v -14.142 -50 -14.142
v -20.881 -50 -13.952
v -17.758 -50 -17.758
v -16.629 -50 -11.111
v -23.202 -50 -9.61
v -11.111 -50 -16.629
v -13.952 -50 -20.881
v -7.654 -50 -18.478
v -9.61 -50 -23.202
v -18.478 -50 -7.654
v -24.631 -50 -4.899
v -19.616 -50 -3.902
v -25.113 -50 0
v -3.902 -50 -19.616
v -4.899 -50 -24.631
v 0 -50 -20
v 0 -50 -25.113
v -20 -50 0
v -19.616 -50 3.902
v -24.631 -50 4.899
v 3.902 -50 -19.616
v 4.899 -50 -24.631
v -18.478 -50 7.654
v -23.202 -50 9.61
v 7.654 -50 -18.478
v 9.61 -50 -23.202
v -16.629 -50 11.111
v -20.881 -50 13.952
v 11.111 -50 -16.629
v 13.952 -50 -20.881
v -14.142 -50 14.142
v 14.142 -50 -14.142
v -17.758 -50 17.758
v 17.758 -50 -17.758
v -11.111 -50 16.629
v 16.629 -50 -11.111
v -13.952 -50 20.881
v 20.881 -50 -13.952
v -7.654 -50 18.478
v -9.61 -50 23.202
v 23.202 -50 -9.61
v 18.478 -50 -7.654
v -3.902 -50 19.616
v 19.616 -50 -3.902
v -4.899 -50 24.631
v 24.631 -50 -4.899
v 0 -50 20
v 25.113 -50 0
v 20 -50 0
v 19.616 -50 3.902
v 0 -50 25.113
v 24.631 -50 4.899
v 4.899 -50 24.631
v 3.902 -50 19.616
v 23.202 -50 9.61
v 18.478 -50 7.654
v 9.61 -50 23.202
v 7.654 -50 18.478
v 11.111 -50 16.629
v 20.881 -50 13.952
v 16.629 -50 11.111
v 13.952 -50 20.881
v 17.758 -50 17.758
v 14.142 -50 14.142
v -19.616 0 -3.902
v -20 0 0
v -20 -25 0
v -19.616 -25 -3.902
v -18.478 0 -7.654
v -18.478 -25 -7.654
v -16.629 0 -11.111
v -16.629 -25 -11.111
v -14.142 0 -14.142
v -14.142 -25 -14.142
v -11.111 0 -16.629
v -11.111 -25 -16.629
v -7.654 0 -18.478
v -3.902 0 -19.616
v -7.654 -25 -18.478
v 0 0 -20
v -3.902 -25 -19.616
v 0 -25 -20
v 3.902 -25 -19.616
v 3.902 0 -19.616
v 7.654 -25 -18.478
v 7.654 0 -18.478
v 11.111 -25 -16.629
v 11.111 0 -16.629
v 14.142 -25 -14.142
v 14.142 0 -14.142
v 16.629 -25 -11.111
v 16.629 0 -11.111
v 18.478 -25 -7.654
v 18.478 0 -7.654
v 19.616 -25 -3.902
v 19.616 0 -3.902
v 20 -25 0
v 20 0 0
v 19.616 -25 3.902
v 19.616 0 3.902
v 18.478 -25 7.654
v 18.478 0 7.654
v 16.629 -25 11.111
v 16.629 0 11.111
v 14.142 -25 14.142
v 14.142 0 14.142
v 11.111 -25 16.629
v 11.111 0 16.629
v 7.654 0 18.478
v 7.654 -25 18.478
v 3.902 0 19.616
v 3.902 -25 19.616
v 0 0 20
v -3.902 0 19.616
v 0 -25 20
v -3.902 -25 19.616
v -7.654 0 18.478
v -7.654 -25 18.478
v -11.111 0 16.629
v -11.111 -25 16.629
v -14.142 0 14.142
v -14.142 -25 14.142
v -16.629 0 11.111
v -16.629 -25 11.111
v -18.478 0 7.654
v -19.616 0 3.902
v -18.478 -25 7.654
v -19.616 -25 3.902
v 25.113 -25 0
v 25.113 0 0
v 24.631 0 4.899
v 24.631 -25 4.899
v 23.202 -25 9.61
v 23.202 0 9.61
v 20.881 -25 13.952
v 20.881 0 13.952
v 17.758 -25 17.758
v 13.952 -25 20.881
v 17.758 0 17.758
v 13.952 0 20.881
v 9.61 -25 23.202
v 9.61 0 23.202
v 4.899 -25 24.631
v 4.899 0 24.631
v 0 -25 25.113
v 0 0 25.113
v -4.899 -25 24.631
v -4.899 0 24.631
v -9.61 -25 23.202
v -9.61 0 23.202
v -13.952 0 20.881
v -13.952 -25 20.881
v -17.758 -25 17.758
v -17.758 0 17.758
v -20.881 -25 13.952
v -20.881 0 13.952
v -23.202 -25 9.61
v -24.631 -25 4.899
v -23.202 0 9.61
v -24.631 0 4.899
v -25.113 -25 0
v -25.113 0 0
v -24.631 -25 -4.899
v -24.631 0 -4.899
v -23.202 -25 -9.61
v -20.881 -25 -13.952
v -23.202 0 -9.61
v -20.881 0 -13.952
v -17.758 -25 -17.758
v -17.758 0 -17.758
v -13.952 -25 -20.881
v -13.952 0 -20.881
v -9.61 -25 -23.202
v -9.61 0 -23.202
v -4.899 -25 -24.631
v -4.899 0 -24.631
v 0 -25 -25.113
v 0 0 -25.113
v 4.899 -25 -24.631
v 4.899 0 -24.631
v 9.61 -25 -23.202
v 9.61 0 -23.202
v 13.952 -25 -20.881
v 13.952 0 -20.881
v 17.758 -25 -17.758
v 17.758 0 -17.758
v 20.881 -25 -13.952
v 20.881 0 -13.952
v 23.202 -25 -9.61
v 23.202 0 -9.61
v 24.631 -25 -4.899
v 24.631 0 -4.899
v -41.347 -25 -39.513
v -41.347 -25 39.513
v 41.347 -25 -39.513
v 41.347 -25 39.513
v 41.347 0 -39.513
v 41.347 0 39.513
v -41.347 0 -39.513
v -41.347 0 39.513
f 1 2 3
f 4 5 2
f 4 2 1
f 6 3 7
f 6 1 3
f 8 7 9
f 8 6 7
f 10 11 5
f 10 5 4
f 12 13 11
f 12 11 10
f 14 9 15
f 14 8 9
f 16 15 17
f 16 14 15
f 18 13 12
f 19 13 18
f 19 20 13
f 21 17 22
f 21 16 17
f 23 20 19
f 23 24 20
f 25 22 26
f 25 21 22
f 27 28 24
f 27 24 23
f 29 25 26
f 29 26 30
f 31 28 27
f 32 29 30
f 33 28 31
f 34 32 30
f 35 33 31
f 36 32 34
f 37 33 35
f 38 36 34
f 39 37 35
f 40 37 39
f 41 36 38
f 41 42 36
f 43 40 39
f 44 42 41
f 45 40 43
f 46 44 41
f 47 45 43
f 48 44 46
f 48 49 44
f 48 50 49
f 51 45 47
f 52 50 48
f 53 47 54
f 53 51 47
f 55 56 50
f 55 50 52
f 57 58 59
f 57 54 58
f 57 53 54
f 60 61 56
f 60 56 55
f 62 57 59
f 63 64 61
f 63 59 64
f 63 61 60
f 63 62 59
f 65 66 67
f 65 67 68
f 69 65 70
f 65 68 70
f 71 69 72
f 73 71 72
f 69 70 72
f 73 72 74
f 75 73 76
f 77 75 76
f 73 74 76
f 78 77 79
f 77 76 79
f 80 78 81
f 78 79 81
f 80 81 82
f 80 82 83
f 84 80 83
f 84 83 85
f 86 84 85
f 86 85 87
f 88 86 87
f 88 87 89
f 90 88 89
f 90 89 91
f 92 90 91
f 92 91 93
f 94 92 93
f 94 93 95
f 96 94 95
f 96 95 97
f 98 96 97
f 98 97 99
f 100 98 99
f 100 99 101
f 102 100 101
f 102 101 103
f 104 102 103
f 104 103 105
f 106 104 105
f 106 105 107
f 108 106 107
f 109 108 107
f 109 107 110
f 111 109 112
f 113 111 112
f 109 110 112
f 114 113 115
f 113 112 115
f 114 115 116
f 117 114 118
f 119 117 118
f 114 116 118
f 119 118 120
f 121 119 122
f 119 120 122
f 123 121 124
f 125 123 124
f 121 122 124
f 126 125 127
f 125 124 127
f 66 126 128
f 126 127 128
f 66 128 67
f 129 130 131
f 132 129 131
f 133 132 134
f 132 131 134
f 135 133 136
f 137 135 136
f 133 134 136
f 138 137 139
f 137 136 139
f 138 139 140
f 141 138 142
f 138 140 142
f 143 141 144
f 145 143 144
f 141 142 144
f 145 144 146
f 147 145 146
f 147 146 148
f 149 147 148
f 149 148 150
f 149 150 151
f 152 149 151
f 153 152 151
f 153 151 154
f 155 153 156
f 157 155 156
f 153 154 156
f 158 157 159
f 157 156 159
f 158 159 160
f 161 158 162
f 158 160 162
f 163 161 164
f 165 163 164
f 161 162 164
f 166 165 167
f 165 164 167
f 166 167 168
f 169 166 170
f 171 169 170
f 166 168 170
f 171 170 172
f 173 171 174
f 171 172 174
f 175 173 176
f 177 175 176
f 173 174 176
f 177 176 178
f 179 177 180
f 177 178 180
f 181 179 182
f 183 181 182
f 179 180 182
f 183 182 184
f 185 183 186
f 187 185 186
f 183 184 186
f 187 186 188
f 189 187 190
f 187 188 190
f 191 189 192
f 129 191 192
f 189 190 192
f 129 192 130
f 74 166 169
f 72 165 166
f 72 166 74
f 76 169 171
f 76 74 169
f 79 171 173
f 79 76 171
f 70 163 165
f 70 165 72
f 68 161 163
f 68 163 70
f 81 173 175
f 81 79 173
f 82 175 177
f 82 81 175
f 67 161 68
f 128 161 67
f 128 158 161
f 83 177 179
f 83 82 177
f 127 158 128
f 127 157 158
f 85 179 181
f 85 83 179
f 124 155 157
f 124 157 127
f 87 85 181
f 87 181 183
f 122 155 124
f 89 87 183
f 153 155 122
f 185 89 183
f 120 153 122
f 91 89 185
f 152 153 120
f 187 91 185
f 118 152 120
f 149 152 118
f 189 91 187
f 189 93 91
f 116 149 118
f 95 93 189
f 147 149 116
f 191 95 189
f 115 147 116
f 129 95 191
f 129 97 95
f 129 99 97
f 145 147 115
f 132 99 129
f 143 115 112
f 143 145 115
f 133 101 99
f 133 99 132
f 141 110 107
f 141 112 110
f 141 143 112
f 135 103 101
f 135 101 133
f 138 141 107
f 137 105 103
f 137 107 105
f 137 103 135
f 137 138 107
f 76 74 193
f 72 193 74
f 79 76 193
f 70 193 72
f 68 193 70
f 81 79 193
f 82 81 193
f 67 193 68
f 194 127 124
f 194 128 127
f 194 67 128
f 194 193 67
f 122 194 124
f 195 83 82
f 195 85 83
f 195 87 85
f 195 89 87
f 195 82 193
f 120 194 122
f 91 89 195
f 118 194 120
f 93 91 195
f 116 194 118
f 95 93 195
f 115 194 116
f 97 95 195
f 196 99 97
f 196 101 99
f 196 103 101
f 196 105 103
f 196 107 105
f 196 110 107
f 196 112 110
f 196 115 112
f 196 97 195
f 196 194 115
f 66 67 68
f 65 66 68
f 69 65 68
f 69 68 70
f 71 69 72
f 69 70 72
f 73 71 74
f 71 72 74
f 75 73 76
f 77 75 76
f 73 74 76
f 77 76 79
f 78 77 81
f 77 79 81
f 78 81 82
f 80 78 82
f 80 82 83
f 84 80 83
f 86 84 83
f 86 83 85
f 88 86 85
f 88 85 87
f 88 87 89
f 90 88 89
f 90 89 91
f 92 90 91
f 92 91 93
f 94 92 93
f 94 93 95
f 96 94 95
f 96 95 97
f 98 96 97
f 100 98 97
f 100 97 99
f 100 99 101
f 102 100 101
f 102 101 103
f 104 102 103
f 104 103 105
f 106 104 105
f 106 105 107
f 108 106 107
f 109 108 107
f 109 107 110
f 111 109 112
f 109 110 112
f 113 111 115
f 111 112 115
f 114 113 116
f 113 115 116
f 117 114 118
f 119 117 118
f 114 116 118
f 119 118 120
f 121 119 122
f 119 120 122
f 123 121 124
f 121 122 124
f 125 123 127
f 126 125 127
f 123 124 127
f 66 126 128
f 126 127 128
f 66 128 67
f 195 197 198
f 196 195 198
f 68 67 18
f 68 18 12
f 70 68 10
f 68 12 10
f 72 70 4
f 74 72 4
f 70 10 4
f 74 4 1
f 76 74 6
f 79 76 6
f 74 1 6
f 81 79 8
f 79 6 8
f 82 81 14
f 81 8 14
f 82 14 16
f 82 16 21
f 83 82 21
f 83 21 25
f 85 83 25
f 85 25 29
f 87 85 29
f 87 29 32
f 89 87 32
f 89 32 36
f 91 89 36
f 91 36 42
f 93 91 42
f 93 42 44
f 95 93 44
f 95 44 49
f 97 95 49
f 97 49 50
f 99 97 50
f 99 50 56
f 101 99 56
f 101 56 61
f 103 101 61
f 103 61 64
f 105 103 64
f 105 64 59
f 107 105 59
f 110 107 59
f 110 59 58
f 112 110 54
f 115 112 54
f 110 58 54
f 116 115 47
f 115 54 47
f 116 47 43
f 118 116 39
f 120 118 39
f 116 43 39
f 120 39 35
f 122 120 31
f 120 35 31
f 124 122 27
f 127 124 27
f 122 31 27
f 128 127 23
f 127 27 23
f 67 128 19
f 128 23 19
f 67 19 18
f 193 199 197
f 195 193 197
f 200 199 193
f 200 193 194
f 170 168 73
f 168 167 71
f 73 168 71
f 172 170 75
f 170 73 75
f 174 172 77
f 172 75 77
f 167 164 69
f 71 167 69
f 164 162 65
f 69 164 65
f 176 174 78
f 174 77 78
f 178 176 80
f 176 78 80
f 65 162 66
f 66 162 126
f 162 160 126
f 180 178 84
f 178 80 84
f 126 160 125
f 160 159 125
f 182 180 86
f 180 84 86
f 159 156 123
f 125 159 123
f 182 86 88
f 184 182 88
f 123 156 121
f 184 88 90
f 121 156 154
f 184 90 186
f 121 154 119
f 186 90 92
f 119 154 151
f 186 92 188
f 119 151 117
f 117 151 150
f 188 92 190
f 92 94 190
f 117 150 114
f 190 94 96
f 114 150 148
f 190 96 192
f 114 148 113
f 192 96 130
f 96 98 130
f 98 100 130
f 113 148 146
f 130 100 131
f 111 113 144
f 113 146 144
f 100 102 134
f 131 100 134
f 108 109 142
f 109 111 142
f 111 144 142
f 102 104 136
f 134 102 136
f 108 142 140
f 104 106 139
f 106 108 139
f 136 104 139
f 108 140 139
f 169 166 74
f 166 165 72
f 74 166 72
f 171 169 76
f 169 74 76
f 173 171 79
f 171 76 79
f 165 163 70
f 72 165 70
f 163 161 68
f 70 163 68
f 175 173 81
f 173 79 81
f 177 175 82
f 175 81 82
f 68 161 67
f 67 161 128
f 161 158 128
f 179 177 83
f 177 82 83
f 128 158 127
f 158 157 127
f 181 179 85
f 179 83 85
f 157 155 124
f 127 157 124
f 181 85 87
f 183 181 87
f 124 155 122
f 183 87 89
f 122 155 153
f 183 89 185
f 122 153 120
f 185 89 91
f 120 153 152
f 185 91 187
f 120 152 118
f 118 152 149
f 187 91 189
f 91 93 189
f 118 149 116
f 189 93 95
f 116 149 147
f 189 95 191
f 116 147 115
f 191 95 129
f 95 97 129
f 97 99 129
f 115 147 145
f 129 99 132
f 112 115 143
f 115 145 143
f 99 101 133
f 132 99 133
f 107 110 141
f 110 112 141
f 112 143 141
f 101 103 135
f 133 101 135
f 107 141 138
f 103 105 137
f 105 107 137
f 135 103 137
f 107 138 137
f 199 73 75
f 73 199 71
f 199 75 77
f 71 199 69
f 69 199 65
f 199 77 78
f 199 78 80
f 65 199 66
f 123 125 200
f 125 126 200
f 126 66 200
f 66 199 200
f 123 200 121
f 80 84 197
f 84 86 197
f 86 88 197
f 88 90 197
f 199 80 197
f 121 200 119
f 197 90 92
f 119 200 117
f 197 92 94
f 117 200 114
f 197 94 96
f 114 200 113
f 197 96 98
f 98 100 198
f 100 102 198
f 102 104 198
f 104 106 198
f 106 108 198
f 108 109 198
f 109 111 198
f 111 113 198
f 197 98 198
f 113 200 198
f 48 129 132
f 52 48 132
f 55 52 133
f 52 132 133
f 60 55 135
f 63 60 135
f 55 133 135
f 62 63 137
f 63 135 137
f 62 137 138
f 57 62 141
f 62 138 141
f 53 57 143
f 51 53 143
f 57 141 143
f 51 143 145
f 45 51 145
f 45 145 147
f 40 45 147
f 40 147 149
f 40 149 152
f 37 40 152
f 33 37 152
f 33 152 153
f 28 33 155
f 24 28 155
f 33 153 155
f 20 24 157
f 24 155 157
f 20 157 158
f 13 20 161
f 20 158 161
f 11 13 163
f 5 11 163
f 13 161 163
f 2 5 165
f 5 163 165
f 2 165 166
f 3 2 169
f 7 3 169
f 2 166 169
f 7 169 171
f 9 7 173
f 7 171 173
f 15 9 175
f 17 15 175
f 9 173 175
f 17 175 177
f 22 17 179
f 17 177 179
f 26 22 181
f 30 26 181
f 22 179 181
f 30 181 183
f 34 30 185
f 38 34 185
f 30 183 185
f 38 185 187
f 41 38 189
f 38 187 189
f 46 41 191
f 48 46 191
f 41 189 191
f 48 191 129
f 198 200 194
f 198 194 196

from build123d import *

# Parameters (mm, degrees)
F0_W     = 82.6933681965
F0_H     = 79.0255218744
F2_DEPTH = 25
F1_R     = 25.1134324312
F3_DEPTH = 25
F5_D     = 40
F5_2_D   = 40
F5_3_D   = 40


with BuildPart() as f2:
    # F0 (on Front) → F2 (new body)
    with BuildSketch(Plane.XZ):
        Rectangle(F0_W, F0_H)
    extrude(amount=F2_DEPTH)

    # F5 (through all)
    with Locations(Plane(origin=(0, 0, 0), x_dir=(1, 0, 0), z_dir=(0, 1, 0))):
        with Locations((0, 0)):
            Hole(F5_D / 2)


with BuildPart() as f2b:
    # F1 (on Front) → F2, piece 2 (new body)
    with BuildSketch(Plane.XZ):
        Circle(F1_R)
    extrude(amount=F2_DEPTH)


with BuildPart() as f3:
    # F3 (new): a face of the model
    f3_faces = [f2b.part.faces().sort_by_distance(p)[0] for p in [
        (0, -25, 0),
    ]]
    extrude(f3_faces, amount=F3_DEPTH)

    # F5#3 (through all)
    with Locations(Plane(origin=(0, 0, 0), x_dir=(1, 0, 0), z_dir=(0, 1, 0))):
        with Locations((0, 0)):
            Hole(F5_3_D / 2)


with BuildPart() as f2b_1:
    add(f2b.part)

    # F5#2 (through all)
    with Locations(Plane(origin=(0, 0, 0), x_dir=(1, 0, 0), z_dir=(0, 1, 0))):
        with Locations((0, 0)):
            Hole(F5_2_D / 2)


solid = Compound([f2.part, f3.part, f2b_1.part])
